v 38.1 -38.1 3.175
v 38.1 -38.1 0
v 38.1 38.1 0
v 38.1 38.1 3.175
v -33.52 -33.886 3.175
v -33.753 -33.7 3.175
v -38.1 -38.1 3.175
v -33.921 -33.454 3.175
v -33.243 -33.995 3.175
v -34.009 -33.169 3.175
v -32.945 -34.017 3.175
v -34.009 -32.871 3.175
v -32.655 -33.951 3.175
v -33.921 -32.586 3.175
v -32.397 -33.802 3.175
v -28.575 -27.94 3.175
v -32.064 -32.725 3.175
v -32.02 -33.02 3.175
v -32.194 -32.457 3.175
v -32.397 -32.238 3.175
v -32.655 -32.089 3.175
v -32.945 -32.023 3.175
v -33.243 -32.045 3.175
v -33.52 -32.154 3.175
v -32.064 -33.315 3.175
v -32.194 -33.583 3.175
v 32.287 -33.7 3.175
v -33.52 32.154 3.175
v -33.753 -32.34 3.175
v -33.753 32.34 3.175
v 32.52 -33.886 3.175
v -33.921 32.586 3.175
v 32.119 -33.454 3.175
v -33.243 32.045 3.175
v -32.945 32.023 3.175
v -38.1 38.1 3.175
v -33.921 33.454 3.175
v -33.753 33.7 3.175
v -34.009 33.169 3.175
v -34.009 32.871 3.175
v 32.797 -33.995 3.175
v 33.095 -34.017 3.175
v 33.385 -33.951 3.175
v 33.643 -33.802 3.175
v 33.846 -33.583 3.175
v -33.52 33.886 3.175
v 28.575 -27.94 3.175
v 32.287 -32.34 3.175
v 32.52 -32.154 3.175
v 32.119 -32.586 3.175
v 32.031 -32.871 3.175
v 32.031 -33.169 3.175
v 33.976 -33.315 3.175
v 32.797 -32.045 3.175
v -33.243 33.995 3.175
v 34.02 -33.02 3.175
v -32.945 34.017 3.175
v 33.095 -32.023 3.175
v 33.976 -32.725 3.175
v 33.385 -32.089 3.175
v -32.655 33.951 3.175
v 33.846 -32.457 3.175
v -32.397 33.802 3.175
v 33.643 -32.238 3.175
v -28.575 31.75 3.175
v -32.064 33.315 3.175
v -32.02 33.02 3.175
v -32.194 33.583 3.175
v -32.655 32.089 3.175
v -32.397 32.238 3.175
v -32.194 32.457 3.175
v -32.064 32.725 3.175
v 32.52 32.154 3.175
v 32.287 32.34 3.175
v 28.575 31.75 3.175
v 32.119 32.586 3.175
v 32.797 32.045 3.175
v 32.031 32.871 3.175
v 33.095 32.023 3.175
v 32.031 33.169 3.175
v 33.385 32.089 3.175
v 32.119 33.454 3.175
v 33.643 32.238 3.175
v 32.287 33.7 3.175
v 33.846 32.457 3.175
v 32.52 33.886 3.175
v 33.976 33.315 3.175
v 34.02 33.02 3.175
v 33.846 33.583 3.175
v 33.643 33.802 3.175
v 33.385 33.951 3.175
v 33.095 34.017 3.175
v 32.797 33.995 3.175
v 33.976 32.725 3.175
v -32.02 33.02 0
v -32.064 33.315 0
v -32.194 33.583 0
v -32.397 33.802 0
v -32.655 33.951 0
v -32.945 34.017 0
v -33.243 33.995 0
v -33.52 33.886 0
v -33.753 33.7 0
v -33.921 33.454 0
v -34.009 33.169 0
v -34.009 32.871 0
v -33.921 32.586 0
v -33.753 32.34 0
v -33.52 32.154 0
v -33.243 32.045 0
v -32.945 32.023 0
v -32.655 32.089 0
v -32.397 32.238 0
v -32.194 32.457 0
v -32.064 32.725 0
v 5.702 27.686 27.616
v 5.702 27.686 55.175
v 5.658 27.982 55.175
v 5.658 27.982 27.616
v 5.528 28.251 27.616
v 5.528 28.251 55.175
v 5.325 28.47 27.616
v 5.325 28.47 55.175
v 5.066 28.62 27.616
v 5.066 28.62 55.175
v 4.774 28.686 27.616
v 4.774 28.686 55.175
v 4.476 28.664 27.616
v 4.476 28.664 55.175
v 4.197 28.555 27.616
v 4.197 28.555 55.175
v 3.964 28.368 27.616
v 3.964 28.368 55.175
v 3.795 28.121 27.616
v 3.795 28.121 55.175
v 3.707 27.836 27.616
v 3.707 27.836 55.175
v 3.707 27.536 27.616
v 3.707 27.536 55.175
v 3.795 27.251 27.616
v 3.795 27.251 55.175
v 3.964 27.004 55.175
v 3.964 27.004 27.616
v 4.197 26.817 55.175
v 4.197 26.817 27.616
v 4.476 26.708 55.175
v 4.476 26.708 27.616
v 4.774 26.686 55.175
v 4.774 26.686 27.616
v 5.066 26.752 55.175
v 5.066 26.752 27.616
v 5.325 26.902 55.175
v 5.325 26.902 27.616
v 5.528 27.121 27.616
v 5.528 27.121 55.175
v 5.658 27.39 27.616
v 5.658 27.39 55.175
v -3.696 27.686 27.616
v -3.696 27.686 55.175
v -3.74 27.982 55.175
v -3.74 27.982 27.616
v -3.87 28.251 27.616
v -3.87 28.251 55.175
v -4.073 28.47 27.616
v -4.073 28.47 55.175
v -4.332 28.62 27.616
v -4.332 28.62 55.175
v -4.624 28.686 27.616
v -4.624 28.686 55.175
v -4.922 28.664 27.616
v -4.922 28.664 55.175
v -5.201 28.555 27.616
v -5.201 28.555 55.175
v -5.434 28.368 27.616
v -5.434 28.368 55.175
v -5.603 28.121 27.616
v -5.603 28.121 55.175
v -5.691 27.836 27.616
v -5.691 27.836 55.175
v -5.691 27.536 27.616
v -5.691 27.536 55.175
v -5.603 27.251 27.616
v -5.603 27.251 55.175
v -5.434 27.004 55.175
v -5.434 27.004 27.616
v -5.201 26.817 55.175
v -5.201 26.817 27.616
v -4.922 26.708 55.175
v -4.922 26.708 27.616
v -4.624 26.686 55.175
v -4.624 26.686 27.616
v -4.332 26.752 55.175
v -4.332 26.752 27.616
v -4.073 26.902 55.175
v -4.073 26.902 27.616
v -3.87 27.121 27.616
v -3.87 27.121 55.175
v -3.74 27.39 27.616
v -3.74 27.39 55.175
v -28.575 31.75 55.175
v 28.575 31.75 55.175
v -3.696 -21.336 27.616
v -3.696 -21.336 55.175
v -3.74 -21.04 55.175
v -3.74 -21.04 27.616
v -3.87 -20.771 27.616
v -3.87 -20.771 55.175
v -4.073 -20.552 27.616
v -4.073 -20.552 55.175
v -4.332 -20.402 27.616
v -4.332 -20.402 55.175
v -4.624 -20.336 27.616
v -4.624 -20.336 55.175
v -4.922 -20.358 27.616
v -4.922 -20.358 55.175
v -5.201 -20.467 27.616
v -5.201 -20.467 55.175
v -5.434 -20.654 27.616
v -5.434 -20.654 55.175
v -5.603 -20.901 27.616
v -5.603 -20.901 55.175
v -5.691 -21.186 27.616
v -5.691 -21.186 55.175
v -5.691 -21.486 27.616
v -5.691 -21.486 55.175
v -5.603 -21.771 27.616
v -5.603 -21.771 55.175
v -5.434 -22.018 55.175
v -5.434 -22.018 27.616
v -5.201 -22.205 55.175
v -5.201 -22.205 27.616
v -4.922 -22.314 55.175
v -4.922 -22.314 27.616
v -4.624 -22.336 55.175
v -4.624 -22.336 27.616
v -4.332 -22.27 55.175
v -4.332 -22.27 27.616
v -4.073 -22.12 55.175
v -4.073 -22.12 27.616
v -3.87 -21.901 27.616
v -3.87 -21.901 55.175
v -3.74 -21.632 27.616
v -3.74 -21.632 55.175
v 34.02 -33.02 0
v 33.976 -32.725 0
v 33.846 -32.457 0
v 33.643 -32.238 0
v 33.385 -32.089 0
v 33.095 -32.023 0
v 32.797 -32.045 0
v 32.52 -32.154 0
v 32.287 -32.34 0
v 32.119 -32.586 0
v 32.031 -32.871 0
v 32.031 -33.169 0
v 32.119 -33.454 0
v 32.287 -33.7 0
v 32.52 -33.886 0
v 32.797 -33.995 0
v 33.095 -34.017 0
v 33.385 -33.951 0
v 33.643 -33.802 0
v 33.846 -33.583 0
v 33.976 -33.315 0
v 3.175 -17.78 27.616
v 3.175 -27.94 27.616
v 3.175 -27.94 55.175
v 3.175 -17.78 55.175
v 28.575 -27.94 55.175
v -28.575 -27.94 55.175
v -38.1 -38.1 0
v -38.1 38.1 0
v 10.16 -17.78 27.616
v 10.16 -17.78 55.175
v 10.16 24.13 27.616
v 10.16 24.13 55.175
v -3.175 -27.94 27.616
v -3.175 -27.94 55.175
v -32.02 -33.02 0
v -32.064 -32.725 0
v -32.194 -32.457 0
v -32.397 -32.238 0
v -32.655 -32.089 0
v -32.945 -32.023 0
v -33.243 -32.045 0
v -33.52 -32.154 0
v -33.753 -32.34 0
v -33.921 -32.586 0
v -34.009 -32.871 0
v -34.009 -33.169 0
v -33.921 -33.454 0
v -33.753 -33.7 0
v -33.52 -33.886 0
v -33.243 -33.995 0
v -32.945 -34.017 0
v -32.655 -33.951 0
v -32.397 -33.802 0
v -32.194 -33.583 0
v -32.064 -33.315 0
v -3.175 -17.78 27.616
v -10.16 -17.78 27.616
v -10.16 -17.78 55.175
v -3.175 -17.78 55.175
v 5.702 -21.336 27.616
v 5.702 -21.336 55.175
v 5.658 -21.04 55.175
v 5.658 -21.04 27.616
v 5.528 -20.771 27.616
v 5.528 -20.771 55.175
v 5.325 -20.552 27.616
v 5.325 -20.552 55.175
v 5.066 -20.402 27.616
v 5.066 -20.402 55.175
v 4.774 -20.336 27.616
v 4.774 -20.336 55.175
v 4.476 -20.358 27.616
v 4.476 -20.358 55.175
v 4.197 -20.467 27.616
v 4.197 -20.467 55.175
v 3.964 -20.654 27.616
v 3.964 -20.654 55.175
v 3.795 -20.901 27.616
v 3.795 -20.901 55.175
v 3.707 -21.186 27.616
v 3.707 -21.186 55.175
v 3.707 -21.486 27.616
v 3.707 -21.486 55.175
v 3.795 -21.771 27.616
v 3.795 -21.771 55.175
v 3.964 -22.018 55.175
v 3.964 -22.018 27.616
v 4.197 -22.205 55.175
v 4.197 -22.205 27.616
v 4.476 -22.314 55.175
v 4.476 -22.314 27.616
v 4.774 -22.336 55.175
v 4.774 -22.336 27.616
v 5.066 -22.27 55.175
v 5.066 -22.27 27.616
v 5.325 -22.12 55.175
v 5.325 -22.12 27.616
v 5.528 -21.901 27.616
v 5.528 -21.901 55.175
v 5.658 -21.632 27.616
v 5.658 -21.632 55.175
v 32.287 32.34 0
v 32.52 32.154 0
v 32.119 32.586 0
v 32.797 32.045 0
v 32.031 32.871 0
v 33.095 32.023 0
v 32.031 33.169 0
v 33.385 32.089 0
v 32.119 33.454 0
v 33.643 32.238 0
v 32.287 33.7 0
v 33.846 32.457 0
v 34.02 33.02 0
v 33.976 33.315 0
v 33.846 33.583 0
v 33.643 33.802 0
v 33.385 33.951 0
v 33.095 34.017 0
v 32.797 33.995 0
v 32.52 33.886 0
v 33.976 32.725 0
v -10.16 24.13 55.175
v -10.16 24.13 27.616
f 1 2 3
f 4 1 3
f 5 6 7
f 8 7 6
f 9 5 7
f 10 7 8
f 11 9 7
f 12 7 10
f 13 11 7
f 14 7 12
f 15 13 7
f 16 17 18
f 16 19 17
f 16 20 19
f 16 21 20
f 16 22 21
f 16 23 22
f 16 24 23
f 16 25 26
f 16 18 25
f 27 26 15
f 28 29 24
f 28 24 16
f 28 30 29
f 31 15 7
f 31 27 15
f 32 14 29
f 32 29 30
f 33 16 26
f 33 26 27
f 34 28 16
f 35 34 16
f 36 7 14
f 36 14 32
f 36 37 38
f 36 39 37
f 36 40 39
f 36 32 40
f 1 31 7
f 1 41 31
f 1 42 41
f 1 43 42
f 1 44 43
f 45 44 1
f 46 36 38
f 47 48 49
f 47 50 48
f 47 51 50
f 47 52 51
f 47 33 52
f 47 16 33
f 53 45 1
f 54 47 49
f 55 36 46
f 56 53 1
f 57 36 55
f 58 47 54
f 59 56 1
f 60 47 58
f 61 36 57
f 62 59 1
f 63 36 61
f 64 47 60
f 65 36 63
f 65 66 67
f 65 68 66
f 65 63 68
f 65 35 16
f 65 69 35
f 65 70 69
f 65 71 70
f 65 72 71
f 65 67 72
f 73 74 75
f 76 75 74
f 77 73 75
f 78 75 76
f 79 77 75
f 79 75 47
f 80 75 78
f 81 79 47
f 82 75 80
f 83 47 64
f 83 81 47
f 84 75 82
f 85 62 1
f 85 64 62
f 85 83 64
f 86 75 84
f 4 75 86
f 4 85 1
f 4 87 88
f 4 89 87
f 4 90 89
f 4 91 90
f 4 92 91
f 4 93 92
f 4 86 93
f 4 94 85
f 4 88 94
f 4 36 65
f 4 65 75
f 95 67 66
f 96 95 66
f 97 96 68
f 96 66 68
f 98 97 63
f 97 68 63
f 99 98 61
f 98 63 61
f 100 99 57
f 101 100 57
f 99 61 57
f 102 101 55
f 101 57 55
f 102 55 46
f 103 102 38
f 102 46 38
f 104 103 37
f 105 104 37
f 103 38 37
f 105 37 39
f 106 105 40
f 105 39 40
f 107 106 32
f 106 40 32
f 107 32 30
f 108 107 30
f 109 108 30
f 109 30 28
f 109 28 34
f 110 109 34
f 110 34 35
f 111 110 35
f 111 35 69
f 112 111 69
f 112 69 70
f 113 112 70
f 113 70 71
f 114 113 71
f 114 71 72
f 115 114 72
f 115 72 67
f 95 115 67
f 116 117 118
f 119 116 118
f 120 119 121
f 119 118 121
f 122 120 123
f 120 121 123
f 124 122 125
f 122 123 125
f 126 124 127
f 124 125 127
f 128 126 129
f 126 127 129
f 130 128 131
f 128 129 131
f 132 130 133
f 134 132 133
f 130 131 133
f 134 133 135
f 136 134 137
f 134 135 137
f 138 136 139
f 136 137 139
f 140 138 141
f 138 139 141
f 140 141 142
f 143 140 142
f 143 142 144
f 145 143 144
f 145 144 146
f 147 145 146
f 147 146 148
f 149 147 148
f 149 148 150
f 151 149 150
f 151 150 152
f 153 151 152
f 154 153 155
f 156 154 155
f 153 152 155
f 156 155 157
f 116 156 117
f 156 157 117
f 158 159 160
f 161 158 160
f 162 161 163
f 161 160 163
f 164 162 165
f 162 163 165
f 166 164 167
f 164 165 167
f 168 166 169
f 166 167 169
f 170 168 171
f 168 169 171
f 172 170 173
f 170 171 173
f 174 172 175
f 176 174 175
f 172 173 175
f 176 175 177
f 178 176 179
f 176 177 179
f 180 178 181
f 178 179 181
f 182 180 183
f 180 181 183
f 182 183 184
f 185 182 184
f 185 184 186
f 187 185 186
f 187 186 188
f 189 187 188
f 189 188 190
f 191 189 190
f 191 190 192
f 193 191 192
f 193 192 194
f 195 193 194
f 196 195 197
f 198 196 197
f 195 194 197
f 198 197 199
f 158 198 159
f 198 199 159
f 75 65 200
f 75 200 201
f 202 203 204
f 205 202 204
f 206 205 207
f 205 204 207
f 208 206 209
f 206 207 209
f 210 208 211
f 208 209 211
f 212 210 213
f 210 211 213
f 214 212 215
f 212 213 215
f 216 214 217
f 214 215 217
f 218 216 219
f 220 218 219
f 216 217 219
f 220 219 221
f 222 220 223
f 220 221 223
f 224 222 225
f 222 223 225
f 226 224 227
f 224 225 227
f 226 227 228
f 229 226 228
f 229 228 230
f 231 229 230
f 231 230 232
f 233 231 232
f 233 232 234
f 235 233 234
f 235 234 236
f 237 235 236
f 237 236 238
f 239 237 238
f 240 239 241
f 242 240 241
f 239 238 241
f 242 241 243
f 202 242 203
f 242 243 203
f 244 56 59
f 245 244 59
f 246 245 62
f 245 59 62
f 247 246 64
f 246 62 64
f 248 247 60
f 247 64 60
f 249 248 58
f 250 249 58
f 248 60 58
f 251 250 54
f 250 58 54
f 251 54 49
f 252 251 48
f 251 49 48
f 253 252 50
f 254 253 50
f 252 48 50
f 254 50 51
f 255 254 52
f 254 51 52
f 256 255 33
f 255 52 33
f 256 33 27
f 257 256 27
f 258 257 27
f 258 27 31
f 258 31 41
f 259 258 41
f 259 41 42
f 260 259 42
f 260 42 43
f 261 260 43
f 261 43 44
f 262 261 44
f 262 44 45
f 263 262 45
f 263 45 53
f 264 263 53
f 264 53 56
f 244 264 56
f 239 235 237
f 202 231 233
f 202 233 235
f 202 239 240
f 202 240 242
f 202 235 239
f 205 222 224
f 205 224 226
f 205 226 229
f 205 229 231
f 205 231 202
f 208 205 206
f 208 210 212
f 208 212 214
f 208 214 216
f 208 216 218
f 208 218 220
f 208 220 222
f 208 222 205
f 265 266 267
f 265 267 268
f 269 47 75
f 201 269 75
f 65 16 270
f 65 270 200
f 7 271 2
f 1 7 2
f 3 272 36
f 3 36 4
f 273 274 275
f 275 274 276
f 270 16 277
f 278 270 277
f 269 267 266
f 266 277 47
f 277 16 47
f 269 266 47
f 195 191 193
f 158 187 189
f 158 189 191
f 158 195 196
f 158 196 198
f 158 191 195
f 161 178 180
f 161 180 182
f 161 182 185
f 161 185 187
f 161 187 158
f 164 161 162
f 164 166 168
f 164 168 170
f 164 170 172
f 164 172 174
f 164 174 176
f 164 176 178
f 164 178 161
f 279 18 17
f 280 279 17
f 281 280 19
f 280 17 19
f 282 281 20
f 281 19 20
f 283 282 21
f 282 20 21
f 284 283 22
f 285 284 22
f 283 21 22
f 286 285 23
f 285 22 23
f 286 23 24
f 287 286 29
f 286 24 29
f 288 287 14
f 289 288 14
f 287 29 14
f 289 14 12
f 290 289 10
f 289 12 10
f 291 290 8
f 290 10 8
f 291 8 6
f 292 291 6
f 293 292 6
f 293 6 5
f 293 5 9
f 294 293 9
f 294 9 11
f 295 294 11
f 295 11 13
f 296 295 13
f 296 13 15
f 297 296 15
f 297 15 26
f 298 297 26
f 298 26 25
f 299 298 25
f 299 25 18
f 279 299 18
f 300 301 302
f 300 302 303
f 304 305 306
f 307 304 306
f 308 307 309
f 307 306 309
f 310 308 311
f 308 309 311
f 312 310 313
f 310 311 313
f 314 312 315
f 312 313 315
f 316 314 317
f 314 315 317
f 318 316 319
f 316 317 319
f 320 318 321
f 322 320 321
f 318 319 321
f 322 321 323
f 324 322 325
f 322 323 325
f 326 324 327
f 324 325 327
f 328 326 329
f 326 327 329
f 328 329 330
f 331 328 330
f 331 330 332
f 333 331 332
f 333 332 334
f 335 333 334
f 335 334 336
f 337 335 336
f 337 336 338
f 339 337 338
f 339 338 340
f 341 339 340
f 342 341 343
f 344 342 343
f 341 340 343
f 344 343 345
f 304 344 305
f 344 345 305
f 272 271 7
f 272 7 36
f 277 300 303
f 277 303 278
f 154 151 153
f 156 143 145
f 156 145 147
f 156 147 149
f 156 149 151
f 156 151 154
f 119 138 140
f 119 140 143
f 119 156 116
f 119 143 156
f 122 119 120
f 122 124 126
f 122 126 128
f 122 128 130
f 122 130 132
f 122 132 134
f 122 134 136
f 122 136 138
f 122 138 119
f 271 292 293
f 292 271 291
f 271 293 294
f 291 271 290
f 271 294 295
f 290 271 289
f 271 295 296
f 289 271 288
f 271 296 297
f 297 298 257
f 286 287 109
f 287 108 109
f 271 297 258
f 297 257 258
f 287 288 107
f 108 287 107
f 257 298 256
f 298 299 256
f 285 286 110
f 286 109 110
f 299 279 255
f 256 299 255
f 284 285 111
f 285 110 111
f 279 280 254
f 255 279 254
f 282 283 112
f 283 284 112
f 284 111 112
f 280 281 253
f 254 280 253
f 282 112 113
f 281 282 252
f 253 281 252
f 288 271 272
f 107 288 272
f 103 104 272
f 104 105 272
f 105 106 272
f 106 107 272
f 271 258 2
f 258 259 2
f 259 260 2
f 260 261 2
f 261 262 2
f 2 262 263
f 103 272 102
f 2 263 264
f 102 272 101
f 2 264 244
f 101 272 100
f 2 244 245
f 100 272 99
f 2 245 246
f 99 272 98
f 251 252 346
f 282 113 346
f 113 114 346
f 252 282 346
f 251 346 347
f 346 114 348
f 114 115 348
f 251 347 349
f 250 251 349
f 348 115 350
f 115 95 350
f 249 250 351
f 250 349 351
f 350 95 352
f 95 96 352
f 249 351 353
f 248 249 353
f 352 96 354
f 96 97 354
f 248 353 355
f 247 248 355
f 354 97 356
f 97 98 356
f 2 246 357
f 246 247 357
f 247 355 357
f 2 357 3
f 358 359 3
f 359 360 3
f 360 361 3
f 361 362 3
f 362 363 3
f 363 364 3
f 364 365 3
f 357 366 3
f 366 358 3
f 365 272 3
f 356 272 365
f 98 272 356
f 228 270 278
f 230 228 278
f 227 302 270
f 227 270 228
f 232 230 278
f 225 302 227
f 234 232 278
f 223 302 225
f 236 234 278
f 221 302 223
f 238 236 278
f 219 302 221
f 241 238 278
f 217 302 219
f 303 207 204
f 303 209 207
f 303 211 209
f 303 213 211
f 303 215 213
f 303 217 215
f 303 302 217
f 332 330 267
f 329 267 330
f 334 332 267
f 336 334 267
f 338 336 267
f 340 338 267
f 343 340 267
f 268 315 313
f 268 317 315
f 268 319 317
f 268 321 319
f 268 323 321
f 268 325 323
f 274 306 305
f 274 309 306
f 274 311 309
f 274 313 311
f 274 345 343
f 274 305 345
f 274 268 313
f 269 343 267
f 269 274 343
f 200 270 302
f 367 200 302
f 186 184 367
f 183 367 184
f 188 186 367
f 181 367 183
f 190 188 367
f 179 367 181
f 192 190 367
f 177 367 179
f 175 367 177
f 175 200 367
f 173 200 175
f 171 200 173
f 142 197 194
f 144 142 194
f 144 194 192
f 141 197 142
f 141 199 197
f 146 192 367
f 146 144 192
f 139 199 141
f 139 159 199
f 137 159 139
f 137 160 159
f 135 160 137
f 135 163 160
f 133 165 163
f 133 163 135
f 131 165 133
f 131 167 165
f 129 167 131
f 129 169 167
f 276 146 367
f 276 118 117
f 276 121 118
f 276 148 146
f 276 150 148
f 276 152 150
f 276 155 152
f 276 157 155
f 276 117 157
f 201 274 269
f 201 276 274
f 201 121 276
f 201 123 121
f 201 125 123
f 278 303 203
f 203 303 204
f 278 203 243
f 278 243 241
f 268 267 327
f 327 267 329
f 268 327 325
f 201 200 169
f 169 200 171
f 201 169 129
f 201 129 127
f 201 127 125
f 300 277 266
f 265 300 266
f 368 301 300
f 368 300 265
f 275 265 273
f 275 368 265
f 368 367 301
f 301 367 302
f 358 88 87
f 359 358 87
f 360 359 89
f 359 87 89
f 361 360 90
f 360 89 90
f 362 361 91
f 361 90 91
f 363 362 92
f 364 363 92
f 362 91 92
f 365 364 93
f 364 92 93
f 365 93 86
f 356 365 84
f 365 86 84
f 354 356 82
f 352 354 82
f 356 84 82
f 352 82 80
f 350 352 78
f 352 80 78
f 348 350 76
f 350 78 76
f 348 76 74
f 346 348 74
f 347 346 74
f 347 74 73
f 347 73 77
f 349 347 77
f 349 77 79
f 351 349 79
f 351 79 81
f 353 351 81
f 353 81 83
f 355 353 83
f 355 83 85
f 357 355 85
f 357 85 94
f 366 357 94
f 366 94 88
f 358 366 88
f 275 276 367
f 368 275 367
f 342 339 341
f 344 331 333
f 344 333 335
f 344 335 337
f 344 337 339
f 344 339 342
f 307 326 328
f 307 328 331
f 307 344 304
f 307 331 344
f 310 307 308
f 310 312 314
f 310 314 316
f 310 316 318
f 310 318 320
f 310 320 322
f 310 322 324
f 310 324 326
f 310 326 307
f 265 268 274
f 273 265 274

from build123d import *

# Parameters (mm, degrees)
F0_W     = 76.2
F0_H     = 76.2
F1_DEPTH = 3.175
F2_R     = 1
F3_DEPTH = 25.4
F4_W     = 57.15
F4_H     = 59.69
F5_DEPTH = 52
F6_R     = 1.0033
F7_DEPTH = 27.559


with BuildPart() as f1:
    # F0 (on Top) → F1 (new body)
    with BuildSketch(Plane.XY):
        Rectangle(F0_W, F0_H)
    extrude(amount=F1_DEPTH)

    # F2 (on face) → F3 (cut)
    with BuildSketch(Plane.XY.offset(3.175)):
        with Locations((-33.02, 33.02)):
            Circle(F2_R)
        with Locations((-33.02, -33.02)):
            Circle(F2_R)
        with Locations((33.02, 33.02)):
            Circle(F2_R)
        with Locations((33.02, -33.02)):
            Circle(F2_R)
    extrude(amount=-F3_DEPTH, mode=Mode.SUBTRACT)

    # F4 (on face) → F5 (join)
    with BuildSketch(Plane.XY.offset(3.175)):
        with Locations((0, 1.905)):
            Rectangle(F4_W, F4_H)
    extrude(amount=F5_DEPTH)

    # F6 (on face) → F7 (cut)
    with BuildSketch(Plane.XY.offset(55.175)):
        Polygon((10.16, -17.78), (10.16, 24.13), (-10.16, 24.13), (-10.16, -17.78), (-3.175, -17.78), (-3.175, -27.94), (3.175, -27.94), (3.175, -17.78), align=None)
        with Locations((-4.699, 27.686)):
            Circle(F6_R)
        with Locations((4.699, 27.686)):
            Circle(F6_R)
        with Locations((-4.699, -21.336)):
            Circle(F6_R)
        with Locations((4.699, -21.336)):
            Circle(F6_R)
    extrude(amount=-F7_DEPTH, mode=Mode.SUBTRACT)


solid = f1.part
